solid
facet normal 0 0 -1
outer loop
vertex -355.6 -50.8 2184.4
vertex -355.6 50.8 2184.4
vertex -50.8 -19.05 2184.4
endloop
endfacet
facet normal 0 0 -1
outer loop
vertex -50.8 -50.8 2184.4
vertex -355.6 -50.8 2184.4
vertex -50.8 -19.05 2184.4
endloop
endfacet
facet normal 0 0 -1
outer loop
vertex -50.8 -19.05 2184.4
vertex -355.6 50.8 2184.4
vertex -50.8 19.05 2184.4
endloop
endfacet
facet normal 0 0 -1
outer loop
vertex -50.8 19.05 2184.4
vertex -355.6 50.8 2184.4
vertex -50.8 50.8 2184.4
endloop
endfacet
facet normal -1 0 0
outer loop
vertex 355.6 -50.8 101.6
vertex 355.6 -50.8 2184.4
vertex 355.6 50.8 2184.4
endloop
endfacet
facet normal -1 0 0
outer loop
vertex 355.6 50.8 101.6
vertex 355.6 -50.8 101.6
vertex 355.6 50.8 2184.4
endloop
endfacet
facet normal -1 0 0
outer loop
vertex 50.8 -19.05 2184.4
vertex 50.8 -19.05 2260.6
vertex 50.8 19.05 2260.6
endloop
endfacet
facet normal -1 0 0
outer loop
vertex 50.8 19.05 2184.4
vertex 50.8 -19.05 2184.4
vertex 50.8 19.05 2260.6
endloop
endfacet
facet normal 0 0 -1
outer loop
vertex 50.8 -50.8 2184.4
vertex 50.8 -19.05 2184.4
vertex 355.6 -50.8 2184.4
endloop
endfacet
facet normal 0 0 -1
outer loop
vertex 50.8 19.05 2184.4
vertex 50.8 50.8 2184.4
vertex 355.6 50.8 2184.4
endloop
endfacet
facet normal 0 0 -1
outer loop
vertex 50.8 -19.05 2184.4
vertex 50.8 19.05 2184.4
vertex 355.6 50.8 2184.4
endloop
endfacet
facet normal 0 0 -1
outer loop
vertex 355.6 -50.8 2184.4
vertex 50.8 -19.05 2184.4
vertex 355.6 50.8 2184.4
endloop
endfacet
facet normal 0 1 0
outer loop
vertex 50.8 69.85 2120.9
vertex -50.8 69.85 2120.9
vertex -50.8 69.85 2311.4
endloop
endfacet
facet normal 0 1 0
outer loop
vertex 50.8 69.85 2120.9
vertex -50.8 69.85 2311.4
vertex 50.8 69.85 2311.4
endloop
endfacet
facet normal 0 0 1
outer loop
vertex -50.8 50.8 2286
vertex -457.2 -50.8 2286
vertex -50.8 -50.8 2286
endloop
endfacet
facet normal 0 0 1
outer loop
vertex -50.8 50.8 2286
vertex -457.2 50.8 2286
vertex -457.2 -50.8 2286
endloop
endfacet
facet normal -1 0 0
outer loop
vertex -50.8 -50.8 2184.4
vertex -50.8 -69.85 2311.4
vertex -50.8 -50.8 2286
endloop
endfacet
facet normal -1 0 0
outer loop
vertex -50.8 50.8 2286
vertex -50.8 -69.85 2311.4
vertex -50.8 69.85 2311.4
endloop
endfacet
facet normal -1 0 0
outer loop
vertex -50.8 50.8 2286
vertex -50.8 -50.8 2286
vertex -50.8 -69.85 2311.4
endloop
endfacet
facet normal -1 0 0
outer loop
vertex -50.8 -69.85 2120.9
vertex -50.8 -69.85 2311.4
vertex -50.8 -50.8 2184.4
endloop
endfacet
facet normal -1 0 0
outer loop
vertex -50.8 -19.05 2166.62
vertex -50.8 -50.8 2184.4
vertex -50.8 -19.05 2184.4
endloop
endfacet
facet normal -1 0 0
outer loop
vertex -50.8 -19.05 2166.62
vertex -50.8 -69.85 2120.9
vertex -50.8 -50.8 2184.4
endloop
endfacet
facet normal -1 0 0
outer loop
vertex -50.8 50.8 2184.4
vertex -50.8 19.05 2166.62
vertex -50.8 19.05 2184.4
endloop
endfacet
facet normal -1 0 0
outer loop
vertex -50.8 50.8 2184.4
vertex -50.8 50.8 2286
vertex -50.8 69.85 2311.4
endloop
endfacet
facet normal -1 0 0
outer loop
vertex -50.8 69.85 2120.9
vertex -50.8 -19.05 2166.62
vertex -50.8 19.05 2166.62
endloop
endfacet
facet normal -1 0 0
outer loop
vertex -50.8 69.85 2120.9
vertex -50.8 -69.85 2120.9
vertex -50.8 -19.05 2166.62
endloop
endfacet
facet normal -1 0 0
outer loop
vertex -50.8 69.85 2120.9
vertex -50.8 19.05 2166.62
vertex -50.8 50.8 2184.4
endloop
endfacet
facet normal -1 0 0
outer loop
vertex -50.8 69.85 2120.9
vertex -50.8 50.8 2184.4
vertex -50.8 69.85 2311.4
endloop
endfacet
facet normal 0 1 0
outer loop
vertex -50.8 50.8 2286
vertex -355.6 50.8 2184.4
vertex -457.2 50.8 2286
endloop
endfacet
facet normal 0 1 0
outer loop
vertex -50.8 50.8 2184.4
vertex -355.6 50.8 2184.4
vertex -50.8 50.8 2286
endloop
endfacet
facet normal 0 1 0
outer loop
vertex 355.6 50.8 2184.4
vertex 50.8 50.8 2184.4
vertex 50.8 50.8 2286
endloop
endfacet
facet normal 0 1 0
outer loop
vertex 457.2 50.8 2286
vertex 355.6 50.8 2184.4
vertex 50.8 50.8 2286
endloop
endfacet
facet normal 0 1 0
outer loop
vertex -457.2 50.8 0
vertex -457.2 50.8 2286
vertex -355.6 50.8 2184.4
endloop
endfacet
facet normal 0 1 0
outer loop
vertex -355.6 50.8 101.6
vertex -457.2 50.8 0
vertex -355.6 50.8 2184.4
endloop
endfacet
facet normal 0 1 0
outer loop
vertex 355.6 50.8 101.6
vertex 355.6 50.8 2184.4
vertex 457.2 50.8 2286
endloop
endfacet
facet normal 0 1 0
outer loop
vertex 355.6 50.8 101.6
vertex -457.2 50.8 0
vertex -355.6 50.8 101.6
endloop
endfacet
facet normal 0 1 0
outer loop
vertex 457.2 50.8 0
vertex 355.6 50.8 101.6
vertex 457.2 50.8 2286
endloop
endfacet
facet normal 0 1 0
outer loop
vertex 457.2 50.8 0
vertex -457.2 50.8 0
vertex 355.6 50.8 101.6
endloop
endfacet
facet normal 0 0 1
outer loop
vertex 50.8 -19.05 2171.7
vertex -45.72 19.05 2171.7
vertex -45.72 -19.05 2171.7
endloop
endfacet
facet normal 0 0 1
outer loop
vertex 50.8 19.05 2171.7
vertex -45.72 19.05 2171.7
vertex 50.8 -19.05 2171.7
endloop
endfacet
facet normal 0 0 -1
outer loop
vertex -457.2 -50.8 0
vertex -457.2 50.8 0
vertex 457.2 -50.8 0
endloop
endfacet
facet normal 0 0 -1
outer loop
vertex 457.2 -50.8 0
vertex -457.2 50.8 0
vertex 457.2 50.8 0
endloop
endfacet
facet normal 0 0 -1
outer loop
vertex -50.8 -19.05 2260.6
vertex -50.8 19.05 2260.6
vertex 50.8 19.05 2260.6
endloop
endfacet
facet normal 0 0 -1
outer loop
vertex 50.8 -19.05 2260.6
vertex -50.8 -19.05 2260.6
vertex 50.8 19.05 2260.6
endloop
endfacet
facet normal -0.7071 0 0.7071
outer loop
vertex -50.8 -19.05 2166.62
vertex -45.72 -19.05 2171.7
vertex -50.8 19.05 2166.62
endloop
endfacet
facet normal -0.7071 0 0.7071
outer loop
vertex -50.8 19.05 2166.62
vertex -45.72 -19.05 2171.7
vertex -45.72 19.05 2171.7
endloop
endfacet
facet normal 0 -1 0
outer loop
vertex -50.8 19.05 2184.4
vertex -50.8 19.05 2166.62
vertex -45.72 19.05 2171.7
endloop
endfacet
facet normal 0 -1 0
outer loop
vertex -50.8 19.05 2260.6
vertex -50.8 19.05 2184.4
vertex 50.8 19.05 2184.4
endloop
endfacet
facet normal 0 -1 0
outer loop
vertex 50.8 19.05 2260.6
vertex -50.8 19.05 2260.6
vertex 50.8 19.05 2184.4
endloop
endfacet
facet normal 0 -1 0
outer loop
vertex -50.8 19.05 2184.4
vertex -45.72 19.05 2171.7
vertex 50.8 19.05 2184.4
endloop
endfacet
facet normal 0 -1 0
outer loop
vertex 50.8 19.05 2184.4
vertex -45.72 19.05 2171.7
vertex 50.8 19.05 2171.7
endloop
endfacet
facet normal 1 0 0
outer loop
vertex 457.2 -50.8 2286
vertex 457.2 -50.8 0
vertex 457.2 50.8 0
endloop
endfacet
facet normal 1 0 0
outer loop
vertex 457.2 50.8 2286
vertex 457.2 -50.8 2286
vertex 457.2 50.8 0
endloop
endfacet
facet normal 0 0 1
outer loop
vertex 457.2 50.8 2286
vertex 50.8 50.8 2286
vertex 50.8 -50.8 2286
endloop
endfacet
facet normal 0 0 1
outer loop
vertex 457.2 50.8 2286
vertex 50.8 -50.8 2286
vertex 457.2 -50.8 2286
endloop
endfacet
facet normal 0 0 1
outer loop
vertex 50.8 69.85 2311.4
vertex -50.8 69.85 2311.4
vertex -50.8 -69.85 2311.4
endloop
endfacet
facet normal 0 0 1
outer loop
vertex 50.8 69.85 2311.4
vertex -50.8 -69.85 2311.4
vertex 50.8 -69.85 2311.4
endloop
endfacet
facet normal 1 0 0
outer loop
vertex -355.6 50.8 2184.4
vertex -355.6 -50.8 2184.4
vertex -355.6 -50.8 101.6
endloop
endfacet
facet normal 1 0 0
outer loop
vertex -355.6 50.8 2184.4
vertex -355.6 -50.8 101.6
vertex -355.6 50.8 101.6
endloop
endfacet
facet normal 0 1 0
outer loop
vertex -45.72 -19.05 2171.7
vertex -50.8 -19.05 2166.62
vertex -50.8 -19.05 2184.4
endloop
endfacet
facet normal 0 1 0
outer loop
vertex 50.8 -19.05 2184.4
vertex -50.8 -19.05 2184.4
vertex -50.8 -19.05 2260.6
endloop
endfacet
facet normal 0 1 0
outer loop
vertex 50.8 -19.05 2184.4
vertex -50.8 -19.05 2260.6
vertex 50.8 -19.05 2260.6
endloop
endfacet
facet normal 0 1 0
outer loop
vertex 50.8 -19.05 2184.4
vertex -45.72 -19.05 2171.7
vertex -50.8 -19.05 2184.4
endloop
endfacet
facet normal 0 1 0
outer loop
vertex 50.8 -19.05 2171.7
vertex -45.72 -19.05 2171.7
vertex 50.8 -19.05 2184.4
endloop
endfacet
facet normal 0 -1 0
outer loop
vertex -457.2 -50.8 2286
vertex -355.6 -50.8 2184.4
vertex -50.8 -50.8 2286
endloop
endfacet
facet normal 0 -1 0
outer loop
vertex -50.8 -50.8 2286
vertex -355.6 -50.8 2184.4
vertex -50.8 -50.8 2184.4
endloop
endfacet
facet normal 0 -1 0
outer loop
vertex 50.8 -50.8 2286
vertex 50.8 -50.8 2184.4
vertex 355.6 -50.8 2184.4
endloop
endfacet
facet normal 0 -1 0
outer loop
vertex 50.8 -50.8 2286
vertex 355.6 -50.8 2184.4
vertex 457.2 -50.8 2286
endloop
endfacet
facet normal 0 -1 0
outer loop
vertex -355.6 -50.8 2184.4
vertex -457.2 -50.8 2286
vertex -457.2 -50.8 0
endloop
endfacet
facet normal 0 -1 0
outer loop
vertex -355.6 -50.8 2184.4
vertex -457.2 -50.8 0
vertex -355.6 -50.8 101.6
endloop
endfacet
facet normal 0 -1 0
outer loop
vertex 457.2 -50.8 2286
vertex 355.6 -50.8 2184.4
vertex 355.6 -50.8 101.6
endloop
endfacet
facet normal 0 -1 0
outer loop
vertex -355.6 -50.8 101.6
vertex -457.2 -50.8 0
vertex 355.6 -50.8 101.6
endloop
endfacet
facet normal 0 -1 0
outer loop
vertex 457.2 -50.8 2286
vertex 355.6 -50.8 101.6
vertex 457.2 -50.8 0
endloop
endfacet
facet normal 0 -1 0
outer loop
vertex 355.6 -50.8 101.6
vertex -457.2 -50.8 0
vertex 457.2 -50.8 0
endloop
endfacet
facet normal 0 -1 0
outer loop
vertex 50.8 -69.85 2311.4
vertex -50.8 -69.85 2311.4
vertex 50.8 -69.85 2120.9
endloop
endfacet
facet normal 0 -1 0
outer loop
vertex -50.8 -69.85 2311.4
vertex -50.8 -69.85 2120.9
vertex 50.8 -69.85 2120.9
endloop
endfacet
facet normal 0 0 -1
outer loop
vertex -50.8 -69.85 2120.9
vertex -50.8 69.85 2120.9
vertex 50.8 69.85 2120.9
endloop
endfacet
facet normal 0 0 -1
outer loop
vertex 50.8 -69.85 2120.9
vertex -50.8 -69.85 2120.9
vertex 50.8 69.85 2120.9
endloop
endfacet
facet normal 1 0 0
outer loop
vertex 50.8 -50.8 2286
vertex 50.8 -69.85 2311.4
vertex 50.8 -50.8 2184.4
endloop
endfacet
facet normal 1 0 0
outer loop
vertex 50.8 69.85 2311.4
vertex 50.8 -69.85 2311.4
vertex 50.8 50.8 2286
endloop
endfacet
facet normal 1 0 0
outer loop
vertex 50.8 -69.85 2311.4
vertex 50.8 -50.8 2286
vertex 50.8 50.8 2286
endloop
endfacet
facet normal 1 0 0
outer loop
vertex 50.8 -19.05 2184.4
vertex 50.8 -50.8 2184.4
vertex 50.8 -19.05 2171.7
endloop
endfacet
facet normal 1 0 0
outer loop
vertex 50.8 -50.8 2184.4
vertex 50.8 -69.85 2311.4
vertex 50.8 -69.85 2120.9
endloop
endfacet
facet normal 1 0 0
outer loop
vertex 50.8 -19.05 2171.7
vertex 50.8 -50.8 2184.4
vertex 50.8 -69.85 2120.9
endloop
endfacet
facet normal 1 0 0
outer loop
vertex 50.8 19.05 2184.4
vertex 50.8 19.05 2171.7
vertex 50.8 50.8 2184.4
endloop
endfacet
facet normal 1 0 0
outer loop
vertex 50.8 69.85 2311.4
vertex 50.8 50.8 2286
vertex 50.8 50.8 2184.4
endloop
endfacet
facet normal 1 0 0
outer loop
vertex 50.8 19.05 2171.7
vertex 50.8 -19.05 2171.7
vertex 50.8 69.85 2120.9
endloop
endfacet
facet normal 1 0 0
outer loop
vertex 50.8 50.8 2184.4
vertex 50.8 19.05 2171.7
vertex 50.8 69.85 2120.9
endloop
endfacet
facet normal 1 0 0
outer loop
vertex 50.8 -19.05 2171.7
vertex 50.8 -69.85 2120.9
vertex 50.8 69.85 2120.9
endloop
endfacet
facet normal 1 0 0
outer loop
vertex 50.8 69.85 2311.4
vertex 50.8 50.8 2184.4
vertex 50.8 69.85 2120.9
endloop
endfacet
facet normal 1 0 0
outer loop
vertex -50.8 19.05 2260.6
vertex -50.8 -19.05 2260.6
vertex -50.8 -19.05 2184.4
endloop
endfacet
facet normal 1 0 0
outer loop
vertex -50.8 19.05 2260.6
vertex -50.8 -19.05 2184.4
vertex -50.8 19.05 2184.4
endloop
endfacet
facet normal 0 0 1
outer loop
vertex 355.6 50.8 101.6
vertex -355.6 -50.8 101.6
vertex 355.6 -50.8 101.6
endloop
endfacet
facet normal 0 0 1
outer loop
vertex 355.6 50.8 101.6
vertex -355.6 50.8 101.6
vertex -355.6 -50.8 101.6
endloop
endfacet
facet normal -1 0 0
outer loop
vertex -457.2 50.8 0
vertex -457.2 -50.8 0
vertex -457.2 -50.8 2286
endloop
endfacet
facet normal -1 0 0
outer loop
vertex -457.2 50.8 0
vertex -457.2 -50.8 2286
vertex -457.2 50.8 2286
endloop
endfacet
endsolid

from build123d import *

# Parameters (mm, degrees)
F0_W          = 914.4
F0_H          = 101.6
F1_DEPTH      = 2286
F2_T          = -101.6
F3_W          = 101.6
F3_H          = 139.7
F4_DEPTH      = 165.1
F4_DEPTH_BACK = 25.4
F5_T          = 50.8
F5_T3_DEPTH   = 203.2
F6_SIZE       = 5.08


# Not quite as in the source:
# - a shell that OpenCascade refuses in one call is made with other operations: the cavity is built on its own and cut out


with BuildPart() as f1:
    # F0 (on Top) → F1 (new body)
    with BuildSketch(Plane.XY):
        Rectangle(F0_W, F0_H)
    extrude(amount=F1_DEPTH)

    # F2
    f2_openings = [f1.faces().sort_by_distance(p)[0] for p in [
        (0, -50.8, 1143),
        (0, 50.8, 1143),
    ]]
    offset(amount=F2_T, openings=f2_openings)

    # F3 (on face) → F4 (join, two sides)
    with BuildSketch(Plane.XY.offset(2286)) as f4_sk:
        Rectangle(F3_W, F3_H)
    extrude(amount=-F4_DEPTH)
    extrude(f4_sk.sketch, amount=F4_DEPTH_BACK)

    # F5: shell of thickness 50.8, made by hand


with BuildPart() as f5_core1:
    # F5_t2: copy of F1
    add(f1.part)

    # the walls: a layer under each face that stays
    f5_faces = [f5_core1.faces().sort_by_distance(p)[0] for p in [
        (-457.2, 0, 1143),
        (391.8857142857, 50.8, 2122.7142857143),
        (-391.8857142857, -50.8, 2122.7142857143),
        (0, 0, 0),
        (-254, 0, 2286),
        (-203.2, 0, 2184.4),
        (-355.6, 0, 1143),
        (0, 0, 101.6),
        (355.6, 0, 1143),
        (203.2, 0, 2184.4),
        (254, 0, 2286),
        (457.2, 0, 1143),
        (0, 0, 2120.9),
        (0, 69.85, 2216.15),
        (0, -69.85, 2216.15),
        (0, 0, 2311.4),
    ]]
    thicken(f5_faces, amount=-F5_T, mode=Mode.SUBTRACT)

    # F5_s4 → F5_t3 (cut)
    with BuildSketch(Plane.XZ.offset(-101.6)):
        Polygon((-355.092, 2183.892), (-355.6, 2235.2), (-406.4, 2235.2), (-406.4, 2184.4), align=None)
        Polygon((-355.092, 102.108), (-406.4, 101.6), (-406.4, 50.8), (-355.6, 50.8), align=None)
        Polygon((355.092, 102.108), (355.6, 50.8), (406.4, 50.8), (406.4, 101.6), align=None)
        Polygon((355.092, 2183.892), (406.4, 2184.4), (406.4, 2235.2), (355.6, 2235.2), align=None)
    extrude(amount=F5_T3_DEPTH, mode=Mode.SUBTRACT)


with BuildPart() as f1_1:
    add(f1.part)

    # what is left inside the walls is the cavity
    f5_cavity = [f5_core1.part.solids().sort_by_distance(p)[0] for p in [
        (0, -18.542, 2201.333333),
    ]]
    add(f5_cavity, mode=Mode.SUBTRACT)

    # F6
    f6_edges = [f1_1.edges().sort_by_distance(p)[0] for p in [
        (-50.8, 0, 2171.7),
    ]]
    chamfer(f6_edges, length=F6_SIZE)


solid = f1_1.part
